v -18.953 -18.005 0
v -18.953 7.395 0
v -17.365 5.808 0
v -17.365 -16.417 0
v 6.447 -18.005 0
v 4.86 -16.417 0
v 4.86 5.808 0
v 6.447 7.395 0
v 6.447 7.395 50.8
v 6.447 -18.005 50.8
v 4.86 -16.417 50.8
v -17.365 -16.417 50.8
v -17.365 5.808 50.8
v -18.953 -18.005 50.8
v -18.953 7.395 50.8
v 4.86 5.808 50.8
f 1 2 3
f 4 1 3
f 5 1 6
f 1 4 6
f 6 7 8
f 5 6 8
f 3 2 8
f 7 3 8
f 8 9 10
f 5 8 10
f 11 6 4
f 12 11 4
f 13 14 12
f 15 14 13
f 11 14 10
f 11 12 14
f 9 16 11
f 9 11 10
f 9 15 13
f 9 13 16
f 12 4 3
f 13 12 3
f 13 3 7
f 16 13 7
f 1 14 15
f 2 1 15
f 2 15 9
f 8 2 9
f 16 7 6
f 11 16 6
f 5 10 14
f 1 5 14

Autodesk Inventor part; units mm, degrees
ref_plane "YZ Plane" through (0, 0, 0) normal (1, 0, 0) x (0, 1, 0)
ref_plane "XZ Plane" through (0, 0, 0) normal (0, 1, 0) x (-1, 0, 0)
ref_plane "XY Plane" through (0, 0, 0) normal (0, 0, 1) x (1, 0, 0)
sketch "Sketch1" plane through (0, 0, 0) normal (0, 0, 1) x (1, 0, 0)
  line L0 (-18.9528, 7.3952) -> (6.4472, 7.3952)
  line L1 (6.4472, 7.3952) -> (6.4472, -18.0048)
  line L2 (6.4472, -18.0048) -> (-18.9528, -18.0048)
  line L3 (-18.9528, -18.0048) -> (-18.9528, 7.3952)
  line L4 (-17.3653, 5.8077) -> (4.8597, 5.8077)
  line L5 (4.8597, 5.8077) -> (4.8597, -16.4173)
  line L6 (4.8597, -16.4173) -> (-17.3653, -16.4173)
  line L7 (-17.3653, -16.4173) -> (-17.3653, 5.8077)
  point P0 (0, 0)
  dimension "d0" = 25.4
  dimension "d1" = 25.4
  dimension "d2" = 1.5875
  dimension "d3" = 1.5875
  dimension "d4" = 1.5875
  dimension "d5" = 1.5875
extrude "Extrusion1" add sketch "Sketch1" along normal blind 50.8
properties part number "1-16 tube 2''"
